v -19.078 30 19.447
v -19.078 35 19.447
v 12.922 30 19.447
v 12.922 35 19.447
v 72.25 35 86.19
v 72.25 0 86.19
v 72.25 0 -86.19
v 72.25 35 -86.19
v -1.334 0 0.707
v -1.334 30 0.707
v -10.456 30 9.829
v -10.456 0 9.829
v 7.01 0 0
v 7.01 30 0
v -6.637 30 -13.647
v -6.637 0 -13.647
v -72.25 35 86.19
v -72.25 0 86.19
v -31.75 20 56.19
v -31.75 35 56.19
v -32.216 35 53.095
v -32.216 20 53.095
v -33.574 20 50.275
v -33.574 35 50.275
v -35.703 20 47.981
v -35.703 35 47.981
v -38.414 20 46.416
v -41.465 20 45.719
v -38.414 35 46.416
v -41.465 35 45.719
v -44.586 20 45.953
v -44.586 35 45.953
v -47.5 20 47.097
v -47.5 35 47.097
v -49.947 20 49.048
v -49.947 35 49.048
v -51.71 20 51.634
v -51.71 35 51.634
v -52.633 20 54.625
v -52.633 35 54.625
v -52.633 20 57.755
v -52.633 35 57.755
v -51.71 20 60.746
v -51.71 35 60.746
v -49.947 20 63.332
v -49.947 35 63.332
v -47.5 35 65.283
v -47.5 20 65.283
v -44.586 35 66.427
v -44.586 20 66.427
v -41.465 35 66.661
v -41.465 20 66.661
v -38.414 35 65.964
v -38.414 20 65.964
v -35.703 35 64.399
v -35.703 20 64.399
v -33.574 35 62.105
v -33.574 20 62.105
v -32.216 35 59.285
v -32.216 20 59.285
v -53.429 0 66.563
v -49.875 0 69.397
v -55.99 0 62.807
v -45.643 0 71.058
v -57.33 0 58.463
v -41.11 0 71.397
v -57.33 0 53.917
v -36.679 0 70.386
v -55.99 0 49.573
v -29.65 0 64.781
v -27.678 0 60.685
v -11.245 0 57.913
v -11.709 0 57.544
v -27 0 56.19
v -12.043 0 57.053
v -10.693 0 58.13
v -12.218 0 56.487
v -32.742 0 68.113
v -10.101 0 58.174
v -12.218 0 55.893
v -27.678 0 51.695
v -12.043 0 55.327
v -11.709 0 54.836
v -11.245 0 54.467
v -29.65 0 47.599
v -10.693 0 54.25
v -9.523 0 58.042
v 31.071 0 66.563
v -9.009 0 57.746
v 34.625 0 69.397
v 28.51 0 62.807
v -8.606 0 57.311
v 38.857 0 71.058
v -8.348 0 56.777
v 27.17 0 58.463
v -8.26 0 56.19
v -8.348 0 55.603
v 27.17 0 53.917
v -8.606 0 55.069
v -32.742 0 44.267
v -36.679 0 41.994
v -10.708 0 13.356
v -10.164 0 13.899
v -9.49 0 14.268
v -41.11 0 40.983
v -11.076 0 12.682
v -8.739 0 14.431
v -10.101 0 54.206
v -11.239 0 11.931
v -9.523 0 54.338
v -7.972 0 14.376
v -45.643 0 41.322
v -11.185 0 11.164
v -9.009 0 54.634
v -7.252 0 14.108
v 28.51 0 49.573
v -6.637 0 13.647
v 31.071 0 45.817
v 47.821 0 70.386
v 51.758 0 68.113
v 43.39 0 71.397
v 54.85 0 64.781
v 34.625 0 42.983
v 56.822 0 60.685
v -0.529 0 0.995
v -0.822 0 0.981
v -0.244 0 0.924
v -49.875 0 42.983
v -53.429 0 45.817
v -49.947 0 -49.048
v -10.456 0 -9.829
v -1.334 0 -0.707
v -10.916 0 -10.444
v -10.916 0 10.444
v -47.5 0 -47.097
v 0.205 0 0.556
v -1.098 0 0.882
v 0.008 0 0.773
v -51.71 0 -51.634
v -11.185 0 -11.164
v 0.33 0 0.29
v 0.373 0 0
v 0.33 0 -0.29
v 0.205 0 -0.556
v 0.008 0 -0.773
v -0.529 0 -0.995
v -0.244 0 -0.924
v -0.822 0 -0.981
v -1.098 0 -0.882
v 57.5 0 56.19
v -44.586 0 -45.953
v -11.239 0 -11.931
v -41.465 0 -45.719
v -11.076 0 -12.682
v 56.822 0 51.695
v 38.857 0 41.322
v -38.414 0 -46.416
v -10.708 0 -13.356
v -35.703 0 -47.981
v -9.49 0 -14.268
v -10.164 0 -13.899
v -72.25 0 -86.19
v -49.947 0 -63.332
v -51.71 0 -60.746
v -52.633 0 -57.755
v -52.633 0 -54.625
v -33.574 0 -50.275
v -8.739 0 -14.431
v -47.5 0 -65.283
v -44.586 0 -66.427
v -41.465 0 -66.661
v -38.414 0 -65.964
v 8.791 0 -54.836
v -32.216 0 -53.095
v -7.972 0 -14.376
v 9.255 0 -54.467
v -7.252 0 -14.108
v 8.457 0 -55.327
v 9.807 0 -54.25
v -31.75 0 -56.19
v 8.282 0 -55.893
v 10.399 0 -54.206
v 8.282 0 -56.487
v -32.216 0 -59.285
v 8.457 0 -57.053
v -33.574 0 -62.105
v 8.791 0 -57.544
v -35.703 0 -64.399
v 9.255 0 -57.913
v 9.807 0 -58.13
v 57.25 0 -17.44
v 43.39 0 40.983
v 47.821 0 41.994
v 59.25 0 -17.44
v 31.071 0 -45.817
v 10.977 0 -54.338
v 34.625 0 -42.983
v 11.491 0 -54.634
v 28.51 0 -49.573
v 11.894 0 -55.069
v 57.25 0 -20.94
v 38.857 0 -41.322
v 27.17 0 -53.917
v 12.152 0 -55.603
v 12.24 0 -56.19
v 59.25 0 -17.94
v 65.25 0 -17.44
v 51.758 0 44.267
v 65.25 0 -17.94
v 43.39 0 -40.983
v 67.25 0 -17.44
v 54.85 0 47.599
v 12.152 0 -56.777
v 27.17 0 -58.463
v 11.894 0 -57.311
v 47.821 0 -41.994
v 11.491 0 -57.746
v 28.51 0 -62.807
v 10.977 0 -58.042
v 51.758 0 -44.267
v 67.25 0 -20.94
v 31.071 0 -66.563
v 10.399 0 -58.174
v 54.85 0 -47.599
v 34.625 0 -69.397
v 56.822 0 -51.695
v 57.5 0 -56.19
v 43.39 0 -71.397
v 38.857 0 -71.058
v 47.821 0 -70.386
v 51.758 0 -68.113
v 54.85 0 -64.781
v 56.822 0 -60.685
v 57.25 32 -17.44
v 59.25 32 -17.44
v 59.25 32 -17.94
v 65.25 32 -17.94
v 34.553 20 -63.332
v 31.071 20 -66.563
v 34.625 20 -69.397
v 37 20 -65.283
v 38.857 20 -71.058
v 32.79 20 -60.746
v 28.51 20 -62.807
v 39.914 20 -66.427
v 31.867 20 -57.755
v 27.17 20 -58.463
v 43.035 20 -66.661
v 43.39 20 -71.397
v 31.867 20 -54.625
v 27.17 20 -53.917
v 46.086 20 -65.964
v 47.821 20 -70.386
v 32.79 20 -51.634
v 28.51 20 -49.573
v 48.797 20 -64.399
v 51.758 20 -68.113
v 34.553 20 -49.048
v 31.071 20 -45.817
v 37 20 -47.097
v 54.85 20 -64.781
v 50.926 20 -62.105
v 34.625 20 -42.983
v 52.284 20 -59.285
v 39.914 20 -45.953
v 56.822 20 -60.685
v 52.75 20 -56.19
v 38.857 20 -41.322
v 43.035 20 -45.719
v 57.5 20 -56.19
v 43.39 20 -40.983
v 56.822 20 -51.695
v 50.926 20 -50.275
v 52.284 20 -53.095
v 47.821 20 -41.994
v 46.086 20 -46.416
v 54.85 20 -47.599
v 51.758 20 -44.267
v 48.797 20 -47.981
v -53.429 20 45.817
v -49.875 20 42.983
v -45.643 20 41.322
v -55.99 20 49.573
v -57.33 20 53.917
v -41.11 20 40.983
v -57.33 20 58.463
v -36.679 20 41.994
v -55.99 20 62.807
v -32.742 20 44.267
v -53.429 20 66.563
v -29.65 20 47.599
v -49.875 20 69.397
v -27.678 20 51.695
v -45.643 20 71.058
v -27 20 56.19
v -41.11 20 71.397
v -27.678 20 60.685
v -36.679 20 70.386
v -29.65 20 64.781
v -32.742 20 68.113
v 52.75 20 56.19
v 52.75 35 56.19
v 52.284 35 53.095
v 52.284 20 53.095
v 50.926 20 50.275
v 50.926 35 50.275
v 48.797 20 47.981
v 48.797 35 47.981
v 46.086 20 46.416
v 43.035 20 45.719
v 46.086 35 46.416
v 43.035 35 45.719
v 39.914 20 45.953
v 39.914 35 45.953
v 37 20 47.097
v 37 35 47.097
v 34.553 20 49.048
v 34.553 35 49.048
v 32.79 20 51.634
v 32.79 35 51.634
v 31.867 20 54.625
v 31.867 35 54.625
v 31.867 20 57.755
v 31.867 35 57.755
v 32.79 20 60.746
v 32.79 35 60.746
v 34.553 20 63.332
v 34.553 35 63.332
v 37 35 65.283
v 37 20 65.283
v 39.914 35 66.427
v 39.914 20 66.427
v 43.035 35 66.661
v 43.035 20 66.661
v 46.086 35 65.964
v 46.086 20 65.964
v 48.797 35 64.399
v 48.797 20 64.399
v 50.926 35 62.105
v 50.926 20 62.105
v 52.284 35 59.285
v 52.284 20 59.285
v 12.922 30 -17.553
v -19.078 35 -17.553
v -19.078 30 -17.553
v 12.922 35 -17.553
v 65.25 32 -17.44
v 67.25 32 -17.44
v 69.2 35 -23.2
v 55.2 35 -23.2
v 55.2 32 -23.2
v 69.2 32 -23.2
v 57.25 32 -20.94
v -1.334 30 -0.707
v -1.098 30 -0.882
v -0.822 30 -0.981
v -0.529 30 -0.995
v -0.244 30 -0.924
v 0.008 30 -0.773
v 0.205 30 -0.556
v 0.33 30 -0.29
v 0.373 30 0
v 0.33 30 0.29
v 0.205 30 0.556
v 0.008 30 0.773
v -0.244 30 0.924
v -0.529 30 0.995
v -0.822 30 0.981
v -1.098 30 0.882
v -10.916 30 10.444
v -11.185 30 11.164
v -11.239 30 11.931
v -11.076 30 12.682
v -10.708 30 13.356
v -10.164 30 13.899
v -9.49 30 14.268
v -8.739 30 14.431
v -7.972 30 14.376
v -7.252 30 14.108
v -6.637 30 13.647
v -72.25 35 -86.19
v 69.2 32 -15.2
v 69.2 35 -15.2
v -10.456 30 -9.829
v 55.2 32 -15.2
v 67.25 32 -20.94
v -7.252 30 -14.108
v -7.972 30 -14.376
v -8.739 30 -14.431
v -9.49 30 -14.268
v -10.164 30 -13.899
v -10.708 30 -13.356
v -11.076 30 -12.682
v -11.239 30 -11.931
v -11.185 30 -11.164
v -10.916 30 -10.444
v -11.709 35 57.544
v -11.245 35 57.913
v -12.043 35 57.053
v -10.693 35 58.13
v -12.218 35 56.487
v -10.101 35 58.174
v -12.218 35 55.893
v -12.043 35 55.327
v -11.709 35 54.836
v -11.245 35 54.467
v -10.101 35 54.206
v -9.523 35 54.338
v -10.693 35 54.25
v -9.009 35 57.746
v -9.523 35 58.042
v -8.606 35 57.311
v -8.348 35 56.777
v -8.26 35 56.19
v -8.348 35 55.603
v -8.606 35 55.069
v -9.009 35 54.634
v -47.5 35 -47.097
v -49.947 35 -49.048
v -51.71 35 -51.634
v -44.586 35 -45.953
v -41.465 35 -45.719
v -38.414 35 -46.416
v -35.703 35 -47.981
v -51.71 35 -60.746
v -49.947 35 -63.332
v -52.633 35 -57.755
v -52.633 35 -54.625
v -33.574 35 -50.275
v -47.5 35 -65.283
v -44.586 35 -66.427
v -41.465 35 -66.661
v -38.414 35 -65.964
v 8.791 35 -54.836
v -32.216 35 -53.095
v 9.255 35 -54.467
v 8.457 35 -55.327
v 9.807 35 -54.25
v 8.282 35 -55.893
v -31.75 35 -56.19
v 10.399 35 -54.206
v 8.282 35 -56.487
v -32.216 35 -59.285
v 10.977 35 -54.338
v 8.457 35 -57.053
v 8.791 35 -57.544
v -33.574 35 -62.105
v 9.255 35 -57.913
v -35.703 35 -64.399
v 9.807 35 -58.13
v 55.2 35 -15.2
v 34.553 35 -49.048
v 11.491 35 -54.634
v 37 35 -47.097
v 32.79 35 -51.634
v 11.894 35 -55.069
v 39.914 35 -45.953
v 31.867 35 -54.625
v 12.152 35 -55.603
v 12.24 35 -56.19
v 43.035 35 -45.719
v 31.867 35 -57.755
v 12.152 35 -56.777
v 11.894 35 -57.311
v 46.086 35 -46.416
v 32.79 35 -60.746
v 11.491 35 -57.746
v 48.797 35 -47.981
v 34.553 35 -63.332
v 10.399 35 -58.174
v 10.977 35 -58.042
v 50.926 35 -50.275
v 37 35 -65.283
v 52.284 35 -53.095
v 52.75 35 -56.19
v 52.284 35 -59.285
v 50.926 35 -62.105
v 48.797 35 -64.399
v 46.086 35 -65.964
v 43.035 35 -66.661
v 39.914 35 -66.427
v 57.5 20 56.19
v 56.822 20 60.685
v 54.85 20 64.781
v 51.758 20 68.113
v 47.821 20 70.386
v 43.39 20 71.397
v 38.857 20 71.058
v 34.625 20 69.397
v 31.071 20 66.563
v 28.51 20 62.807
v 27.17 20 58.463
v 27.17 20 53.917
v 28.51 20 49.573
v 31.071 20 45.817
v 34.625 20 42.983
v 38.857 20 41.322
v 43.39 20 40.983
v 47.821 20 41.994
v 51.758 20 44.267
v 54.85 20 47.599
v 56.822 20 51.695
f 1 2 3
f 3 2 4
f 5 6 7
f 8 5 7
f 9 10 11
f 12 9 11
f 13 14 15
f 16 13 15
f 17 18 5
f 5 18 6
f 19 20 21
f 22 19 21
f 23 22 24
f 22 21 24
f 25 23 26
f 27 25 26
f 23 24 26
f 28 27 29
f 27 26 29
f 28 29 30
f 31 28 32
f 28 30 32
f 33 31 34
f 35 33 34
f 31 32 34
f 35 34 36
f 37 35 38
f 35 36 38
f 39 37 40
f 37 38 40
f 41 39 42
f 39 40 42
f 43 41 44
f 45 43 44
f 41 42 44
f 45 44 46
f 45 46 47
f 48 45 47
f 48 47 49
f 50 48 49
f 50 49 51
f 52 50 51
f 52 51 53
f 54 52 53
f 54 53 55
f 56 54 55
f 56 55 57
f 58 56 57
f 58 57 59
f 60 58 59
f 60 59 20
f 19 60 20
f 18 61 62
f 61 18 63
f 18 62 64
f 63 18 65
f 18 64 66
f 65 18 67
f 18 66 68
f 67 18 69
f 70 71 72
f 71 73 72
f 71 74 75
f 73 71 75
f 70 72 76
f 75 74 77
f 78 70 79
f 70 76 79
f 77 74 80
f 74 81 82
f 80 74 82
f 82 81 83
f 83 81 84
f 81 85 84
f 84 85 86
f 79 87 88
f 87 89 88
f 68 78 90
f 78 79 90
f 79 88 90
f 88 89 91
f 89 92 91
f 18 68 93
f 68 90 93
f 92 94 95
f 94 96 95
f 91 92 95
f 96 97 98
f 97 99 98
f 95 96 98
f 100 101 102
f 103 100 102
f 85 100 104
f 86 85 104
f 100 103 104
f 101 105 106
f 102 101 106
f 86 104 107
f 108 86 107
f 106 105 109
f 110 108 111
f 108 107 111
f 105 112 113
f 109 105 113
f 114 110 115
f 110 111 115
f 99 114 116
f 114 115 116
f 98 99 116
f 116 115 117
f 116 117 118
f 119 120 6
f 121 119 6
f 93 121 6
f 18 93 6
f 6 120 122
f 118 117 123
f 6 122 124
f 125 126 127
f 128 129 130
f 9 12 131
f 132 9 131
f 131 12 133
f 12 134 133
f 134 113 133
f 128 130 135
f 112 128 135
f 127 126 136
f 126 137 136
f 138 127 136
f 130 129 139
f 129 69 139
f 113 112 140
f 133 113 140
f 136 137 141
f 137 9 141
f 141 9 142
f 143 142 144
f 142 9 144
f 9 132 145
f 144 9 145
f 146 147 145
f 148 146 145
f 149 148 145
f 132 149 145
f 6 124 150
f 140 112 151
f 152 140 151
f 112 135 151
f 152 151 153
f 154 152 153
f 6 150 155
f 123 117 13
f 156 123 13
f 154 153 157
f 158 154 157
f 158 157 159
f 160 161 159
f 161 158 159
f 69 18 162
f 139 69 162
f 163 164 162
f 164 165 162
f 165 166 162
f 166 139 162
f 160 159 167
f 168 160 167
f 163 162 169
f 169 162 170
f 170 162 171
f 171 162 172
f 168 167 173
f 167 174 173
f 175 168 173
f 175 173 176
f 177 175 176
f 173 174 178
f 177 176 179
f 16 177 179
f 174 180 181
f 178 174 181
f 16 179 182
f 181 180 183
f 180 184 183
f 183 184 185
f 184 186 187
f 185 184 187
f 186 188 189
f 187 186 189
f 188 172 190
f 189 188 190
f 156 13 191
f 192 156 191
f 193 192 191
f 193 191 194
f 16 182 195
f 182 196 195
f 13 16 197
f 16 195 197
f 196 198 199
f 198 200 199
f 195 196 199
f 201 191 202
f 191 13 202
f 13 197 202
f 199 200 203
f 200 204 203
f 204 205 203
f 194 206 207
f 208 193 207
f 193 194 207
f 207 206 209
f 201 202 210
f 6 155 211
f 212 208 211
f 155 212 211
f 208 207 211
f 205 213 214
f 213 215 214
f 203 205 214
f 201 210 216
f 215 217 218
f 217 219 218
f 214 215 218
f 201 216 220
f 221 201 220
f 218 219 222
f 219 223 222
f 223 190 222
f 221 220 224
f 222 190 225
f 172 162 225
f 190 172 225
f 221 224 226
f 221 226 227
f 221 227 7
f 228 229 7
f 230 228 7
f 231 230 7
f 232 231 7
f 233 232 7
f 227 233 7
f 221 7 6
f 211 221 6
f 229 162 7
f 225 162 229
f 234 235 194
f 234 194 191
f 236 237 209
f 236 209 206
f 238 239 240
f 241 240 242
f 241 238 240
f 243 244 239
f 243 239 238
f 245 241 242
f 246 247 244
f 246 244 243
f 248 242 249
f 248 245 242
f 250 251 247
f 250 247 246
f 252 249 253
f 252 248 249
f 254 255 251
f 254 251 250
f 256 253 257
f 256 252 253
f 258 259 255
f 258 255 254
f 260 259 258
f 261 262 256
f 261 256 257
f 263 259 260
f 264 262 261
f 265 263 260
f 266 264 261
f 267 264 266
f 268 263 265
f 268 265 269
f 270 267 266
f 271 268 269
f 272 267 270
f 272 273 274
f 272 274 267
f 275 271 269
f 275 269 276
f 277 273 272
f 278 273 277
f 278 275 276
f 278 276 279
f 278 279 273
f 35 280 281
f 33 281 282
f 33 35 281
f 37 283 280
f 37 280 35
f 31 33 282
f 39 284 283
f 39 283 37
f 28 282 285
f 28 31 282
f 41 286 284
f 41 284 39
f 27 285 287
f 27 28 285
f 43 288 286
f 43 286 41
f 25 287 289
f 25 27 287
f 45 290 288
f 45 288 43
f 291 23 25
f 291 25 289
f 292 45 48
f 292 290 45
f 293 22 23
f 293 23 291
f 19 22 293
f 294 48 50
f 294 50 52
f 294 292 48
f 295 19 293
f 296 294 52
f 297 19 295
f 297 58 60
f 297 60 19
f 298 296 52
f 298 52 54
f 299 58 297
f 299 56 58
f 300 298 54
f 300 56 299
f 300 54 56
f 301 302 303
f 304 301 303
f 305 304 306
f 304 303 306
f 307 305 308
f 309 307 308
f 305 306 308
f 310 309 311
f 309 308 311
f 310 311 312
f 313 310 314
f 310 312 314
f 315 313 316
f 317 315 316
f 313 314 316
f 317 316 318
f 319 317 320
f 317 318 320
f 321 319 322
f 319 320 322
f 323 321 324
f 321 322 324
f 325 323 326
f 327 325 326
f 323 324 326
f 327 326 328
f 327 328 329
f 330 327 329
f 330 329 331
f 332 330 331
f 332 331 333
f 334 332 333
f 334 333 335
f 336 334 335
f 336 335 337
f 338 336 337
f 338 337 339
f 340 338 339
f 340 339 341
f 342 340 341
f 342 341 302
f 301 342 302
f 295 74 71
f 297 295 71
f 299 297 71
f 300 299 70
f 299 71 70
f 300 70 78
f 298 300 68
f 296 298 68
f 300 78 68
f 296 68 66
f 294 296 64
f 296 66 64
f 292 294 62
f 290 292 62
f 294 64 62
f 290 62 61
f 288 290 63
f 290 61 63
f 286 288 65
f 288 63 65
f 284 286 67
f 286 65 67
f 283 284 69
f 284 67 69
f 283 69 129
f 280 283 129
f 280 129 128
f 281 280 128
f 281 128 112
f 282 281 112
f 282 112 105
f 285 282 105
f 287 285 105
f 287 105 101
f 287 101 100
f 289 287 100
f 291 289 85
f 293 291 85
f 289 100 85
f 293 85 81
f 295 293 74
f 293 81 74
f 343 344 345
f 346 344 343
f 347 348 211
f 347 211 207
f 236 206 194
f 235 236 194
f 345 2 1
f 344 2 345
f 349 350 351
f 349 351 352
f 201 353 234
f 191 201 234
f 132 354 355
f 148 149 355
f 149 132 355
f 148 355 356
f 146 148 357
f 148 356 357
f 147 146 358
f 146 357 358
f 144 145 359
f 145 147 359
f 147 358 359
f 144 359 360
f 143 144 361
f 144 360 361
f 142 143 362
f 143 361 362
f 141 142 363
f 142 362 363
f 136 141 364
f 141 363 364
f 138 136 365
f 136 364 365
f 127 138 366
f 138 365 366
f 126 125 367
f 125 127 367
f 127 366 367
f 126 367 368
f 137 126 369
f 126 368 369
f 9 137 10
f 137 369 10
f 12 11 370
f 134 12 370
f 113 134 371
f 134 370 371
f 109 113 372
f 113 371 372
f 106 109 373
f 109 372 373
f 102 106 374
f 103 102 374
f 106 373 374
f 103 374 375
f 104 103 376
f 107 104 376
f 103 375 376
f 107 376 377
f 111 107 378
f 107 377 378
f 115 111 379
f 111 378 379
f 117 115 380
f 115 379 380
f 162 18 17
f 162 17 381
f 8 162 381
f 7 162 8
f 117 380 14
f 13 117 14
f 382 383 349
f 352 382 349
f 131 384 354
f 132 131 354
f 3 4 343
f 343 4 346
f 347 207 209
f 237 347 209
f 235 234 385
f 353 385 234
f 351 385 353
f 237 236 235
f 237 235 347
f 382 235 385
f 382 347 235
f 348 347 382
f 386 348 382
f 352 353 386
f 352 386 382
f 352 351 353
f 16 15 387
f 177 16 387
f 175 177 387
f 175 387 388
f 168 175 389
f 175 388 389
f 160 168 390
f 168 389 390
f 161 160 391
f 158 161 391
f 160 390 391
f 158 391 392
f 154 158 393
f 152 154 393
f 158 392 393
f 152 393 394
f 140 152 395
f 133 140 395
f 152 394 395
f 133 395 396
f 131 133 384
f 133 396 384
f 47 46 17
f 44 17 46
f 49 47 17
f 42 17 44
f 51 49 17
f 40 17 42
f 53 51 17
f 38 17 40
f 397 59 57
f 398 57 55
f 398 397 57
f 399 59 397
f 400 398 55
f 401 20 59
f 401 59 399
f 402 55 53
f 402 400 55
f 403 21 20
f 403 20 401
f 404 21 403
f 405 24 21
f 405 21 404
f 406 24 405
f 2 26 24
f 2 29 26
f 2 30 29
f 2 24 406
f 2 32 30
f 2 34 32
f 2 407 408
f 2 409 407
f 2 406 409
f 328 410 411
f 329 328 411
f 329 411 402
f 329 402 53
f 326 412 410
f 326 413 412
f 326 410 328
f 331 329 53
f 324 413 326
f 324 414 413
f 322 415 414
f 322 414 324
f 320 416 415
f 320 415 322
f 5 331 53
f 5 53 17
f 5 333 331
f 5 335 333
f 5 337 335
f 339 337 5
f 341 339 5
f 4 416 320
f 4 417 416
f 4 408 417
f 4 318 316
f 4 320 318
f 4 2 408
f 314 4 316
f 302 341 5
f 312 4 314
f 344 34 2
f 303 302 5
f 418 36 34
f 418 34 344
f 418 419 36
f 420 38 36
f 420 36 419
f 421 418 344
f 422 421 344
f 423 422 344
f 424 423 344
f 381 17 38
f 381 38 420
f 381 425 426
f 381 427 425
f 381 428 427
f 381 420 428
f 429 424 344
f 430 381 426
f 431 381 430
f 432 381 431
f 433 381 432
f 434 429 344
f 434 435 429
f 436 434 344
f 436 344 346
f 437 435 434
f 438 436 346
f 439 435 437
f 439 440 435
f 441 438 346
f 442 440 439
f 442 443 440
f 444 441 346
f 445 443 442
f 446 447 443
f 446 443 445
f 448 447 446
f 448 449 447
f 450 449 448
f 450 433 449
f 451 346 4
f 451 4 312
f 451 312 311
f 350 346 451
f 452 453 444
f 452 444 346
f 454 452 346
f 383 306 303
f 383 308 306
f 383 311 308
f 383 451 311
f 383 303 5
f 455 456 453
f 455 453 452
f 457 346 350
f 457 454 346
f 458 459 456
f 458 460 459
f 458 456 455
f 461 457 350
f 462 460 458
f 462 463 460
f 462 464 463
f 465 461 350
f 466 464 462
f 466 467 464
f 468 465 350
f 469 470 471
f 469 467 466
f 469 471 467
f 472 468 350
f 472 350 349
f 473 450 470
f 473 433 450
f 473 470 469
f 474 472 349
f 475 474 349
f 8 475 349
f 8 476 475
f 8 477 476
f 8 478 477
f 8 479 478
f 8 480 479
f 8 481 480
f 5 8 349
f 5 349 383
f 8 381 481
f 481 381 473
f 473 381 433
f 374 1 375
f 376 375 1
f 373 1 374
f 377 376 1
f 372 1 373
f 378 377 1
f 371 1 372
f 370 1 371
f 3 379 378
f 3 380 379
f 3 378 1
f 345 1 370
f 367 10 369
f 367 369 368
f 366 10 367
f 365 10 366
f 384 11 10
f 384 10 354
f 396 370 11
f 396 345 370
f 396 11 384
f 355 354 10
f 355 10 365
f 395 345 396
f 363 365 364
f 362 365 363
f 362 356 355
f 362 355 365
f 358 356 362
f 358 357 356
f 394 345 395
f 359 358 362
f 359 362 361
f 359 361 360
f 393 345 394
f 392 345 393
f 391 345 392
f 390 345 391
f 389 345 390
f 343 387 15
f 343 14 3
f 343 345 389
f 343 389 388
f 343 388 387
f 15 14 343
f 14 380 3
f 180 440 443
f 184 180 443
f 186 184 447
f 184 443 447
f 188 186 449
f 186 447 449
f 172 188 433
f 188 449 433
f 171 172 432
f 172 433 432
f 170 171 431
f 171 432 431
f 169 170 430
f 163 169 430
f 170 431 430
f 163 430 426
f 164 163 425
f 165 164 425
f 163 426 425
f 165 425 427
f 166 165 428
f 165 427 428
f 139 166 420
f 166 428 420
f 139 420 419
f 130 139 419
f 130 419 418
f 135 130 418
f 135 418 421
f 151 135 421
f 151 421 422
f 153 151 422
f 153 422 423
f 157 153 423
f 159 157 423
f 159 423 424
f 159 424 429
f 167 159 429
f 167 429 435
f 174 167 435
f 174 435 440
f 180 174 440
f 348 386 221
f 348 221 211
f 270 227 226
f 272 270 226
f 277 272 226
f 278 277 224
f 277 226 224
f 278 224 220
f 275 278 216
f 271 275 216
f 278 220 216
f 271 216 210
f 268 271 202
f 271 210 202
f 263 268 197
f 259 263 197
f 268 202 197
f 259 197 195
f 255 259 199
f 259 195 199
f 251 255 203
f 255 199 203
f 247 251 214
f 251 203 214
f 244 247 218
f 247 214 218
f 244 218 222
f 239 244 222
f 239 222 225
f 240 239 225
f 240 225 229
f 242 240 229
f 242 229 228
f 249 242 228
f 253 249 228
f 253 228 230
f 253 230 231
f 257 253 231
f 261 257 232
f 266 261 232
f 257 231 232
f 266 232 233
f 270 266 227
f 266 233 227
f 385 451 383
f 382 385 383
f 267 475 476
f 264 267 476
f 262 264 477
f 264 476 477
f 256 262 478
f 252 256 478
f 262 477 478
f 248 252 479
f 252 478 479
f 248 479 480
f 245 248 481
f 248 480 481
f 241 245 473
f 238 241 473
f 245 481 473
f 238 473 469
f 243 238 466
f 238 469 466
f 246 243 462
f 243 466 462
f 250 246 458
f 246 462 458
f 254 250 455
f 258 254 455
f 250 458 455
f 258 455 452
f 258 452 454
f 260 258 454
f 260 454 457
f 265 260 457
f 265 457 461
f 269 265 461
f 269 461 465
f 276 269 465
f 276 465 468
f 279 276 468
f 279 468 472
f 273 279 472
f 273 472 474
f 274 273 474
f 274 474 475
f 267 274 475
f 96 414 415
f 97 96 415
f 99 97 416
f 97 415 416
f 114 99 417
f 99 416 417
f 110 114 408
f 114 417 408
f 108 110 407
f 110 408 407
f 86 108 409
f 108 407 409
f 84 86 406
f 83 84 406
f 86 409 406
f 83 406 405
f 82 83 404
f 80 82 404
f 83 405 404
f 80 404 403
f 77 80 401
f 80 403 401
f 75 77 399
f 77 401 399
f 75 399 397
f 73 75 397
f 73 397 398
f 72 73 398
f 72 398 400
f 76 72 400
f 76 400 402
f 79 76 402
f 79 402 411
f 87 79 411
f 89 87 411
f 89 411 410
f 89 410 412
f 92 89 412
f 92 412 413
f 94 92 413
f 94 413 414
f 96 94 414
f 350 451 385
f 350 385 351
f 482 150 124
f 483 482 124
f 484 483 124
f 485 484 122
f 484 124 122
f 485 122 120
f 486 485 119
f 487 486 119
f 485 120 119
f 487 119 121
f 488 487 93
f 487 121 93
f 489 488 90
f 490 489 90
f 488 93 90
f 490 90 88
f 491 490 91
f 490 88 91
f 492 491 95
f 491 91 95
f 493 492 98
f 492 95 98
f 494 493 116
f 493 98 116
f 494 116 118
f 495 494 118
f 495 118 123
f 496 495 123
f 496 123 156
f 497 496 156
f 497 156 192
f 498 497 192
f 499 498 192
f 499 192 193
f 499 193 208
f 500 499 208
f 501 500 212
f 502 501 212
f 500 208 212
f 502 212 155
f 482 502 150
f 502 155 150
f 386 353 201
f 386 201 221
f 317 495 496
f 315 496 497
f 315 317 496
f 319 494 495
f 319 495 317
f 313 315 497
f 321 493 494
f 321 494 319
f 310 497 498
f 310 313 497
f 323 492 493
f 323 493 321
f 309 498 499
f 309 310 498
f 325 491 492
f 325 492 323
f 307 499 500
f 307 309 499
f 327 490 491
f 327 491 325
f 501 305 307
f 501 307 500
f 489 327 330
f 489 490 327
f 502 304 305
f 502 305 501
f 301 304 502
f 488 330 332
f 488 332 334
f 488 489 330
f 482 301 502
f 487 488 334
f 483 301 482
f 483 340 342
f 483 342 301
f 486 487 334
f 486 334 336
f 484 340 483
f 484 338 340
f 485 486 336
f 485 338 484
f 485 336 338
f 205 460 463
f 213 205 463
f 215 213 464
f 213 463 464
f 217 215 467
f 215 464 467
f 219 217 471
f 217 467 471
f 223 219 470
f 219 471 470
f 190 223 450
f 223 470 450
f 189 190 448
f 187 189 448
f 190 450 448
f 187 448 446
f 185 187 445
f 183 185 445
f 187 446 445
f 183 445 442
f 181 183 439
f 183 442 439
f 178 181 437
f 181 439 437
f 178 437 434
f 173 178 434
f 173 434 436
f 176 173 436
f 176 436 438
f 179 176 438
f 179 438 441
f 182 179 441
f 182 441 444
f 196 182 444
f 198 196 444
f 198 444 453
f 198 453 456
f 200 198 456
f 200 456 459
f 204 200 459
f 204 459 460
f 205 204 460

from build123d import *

# Parameters (mm, degrees)
SKETCH1_W           = 144.5
SKETCH1_H           = 172.38
BOSS_EXTRUDE1_DEPTH = 35
CUT_EXTRUDE1_REACH  = 37
SKETCH6_R           = 10.5
SKETCH6_R_2         = 1.99
SKETCH7_W           = 32
SKETCH7_H           = 37
CUT_EXTRUDE2_DEPTH  = 5
SKETCH8_W           = 14
SKETCH8_H           = 8
CUT_EXTRUDE3_DEPTH  = 3
SKETCH9_R           = 15.25
SKETCH9_R_2         = 16
CUT_EXTRUDE4_DEPTH  = 20


with BuildPart() as part:
    # Sketch1 → Boss-Extrude1 (new body)
    with BuildSketch(Plane(origin=(0, 0, 0), x_dir=(1, 0, 0), z_dir=(0, 1, 0))):
        Rectangle(SKETCH1_W, SKETCH1_H)
    extrude(amount=BOSS_EXTRUDE1_DEPTH)

    # Sketch6 → Cut-Extrude1 (cut, up to next)
    with BuildSketch(Plane(origin=(0, 35, 0), x_dir=(1, 0, 0), z_dir=(0, 1, 0)), mode=Mode.PRIVATE) as cut_extrude1_sk1:
        with Locations((42.25, -56.19)):
            Circle(SKETCH6_R)
    cut_extrude1_tool1 = extrude(cut_extrude1_sk1.sketch, amount=-CUT_EXTRUDE1_REACH, mode=Mode.PRIVATE) & part.part
    add(cut_extrude1_tool1.solids().sort_by_distance((42.25, 35, 56.19))[0], mode=Mode.SUBTRACT)
    # Sketch6 → Cut-Extrude1 (cut, up to next)
    with BuildSketch(Plane(origin=(0, 35, 0), x_dir=(1, 0, 0), z_dir=(0, 1, 0)), mode=Mode.PRIVATE) as cut_extrude1_sk2:
        with Locations((-10.25, -56.19)):
            Circle(SKETCH6_R_2)
    cut_extrude1_tool2 = extrude(cut_extrude1_sk2.sketch, amount=-CUT_EXTRUDE1_REACH, mode=Mode.PRIVATE) & part.part
    add(cut_extrude1_tool2.solids().sort_by_distance((-10.25, 35, 56.19))[0], mode=Mode.SUBTRACT)
    # Sketch6 → Cut-Extrude1 (cut, up to next)
    with BuildSketch(Plane(origin=(0, 35, 0), x_dir=(1, 0, 0), z_dir=(0, 1, 0)), mode=Mode.PRIVATE) as cut_extrude1_sk3:
        with Locations((-42.25, -56.19)):
            Circle(SKETCH6_R)
    cut_extrude1_tool3 = extrude(cut_extrude1_sk3.sketch, amount=-CUT_EXTRUDE1_REACH, mode=Mode.PRIVATE) & part.part
    add(cut_extrude1_tool3.solids().sort_by_distance((-42.25, 35, 56.19))[0], mode=Mode.SUBTRACT)
    # Sketch6 → Cut-Extrude1 (cut, up to next)
    with BuildSketch(Plane(origin=(0, 35, 0), x_dir=(1, 0, 0), z_dir=(0, 1, 0)), mode=Mode.PRIVATE) as cut_extrude1_sk4:
        with Locations((42.25, 56.19)):
            Circle(SKETCH6_R)
    cut_extrude1_tool4 = extrude(cut_extrude1_sk4.sketch, amount=-CUT_EXTRUDE1_REACH, mode=Mode.PRIVATE) & part.part
    add(cut_extrude1_tool4.solids().sort_by_distance((42.25, 35, -56.19))[0], mode=Mode.SUBTRACT)
    # Sketch6 → Cut-Extrude1 (cut, up to next)
    with BuildSketch(Plane(origin=(0, 35, 0), x_dir=(1, 0, 0), z_dir=(0, 1, 0)), mode=Mode.PRIVATE) as cut_extrude1_sk5:
        with Locations((10.25, 56.19)):
            Circle(SKETCH6_R_2)
    cut_extrude1_tool5 = extrude(cut_extrude1_sk5.sketch, amount=-CUT_EXTRUDE1_REACH, mode=Mode.PRIVATE) & part.part
    add(cut_extrude1_tool5.solids().sort_by_distance((10.25, 35, -56.19))[0], mode=Mode.SUBTRACT)
    # Sketch6 → Cut-Extrude1 (cut, up to next)
    with BuildSketch(Plane(origin=(0, 35, 0), x_dir=(1, 0, 0), z_dir=(0, 1, 0)), mode=Mode.PRIVATE) as cut_extrude1_sk6:
        with Locations((-42.25, 56.19)):
            Circle(SKETCH6_R)
    cut_extrude1_tool6 = extrude(cut_extrude1_sk6.sketch, amount=-CUT_EXTRUDE1_REACH, mode=Mode.PRIVATE) & part.part
    add(cut_extrude1_tool6.solids().sort_by_distance((-42.25, 35, -56.19))[0], mode=Mode.SUBTRACT)
    # Sketch6 → Cut-Extrude1 (cut, up to next)
    with BuildSketch(Plane(origin=(0, 35, 0), x_dir=(1, 0, 0), z_dir=(0, 1, 0)), mode=Mode.PRIVATE) as cut_extrude1_sk7:
        with BuildLine():
            Line((-10.455537495, 9.828784258), (-1.333860018, 0.707106781))
            ThreePointArc((-1.333860018, 0.707106781), (0.373246763, 0), (-1.333860018, -0.707106781))
            Line((-1.333860018, -0.707106781), (-10.455537495, -9.828784258))
            ThreePointArc((-10.455537495, -9.828784258), (-10.455537495, -13.647160877), (-6.637160877, -13.647160877))
            Line((-6.637160877, -13.647160877), (7.01, 0))
            Line((7.01, 0), (-6.637160877, 13.647160877))
            ThreePointArc((-6.637160877, 13.647160877), (-10.455537495, 13.647160877), (-10.455537495, 9.828784258))
        make_face()
    cut_extrude1_tool7 = extrude(cut_extrude1_sk7.sketch, amount=-CUT_EXTRUDE1_REACH, mode=Mode.PRIVATE) & part.part
    add(cut_extrude1_tool7.solids().sort_by_distance((-0.05515, 35, 6.582011))[0], mode=Mode.SUBTRACT)
    # Sketch6 → Cut-Extrude1 (cut, up to next)
    with BuildSketch(Plane(origin=(0, 35, 0), x_dir=(1, 0, 0), z_dir=(0, 1, 0)), mode=Mode.PRIVATE) as cut_extrude1_sk8:
        Polygon((67.25, 20.94), (67.25, 17.44), (65.25, 17.44), (65.25, 17.94), (59.25, 17.94), (59.25, 17.44), (57.25, 17.44), (57.25, 17.94), (57.25, 20.94), align=None)
    cut_extrude1_tool8 = extrude(cut_extrude1_sk8.sketch, amount=-CUT_EXTRUDE1_REACH, mode=Mode.PRIVATE) & part.part
    add(cut_extrude1_tool8.solids().sort_by_distance((62.25, 35, -19.330625))[0], mode=Mode.SUBTRACT)

    # Sketch7 → Cut-Extrude2 (cut)
    with BuildSketch(Plane(origin=(0, 35, 0), x_dir=(1, 0, 0), z_dir=(0, 1, 0))):
        with Locations((-3.07777663, -0.946773822)):
            Rectangle(SKETCH7_W, SKETCH7_H)
    extrude(amount=-CUT_EXTRUDE2_DEPTH, mode=Mode.SUBTRACT)

    # Sketch8 → Cut-Extrude3 (cut)
    with BuildSketch(Plane(origin=(0, 35, 0), x_dir=(1, 0, 0), z_dir=(0, 1, 0))):
        with Locations((62.2, 19.2)):
            Rectangle(SKETCH8_W, SKETCH8_H)
    extrude(amount=-CUT_EXTRUDE3_DEPTH, mode=Mode.SUBTRACT)

    # Sketch9 → Cut-Extrude4 (cut)
    with BuildSketch(Plane.XZ):
        with Locations((42.25, -56.19)):
            Circle(SKETCH9_R)
        with Locations((-150, -137.51)):
            Circle(SKETCH9_R_2)
        with Locations((42.25, 56.19)):
            Circle(SKETCH9_R)
        with Locations((-42.25, 56.19)):
            Circle(SKETCH9_R)
    extrude(amount=-CUT_EXTRUDE4_DEPTH, mode=Mode.SUBTRACT)


solid = part.part
